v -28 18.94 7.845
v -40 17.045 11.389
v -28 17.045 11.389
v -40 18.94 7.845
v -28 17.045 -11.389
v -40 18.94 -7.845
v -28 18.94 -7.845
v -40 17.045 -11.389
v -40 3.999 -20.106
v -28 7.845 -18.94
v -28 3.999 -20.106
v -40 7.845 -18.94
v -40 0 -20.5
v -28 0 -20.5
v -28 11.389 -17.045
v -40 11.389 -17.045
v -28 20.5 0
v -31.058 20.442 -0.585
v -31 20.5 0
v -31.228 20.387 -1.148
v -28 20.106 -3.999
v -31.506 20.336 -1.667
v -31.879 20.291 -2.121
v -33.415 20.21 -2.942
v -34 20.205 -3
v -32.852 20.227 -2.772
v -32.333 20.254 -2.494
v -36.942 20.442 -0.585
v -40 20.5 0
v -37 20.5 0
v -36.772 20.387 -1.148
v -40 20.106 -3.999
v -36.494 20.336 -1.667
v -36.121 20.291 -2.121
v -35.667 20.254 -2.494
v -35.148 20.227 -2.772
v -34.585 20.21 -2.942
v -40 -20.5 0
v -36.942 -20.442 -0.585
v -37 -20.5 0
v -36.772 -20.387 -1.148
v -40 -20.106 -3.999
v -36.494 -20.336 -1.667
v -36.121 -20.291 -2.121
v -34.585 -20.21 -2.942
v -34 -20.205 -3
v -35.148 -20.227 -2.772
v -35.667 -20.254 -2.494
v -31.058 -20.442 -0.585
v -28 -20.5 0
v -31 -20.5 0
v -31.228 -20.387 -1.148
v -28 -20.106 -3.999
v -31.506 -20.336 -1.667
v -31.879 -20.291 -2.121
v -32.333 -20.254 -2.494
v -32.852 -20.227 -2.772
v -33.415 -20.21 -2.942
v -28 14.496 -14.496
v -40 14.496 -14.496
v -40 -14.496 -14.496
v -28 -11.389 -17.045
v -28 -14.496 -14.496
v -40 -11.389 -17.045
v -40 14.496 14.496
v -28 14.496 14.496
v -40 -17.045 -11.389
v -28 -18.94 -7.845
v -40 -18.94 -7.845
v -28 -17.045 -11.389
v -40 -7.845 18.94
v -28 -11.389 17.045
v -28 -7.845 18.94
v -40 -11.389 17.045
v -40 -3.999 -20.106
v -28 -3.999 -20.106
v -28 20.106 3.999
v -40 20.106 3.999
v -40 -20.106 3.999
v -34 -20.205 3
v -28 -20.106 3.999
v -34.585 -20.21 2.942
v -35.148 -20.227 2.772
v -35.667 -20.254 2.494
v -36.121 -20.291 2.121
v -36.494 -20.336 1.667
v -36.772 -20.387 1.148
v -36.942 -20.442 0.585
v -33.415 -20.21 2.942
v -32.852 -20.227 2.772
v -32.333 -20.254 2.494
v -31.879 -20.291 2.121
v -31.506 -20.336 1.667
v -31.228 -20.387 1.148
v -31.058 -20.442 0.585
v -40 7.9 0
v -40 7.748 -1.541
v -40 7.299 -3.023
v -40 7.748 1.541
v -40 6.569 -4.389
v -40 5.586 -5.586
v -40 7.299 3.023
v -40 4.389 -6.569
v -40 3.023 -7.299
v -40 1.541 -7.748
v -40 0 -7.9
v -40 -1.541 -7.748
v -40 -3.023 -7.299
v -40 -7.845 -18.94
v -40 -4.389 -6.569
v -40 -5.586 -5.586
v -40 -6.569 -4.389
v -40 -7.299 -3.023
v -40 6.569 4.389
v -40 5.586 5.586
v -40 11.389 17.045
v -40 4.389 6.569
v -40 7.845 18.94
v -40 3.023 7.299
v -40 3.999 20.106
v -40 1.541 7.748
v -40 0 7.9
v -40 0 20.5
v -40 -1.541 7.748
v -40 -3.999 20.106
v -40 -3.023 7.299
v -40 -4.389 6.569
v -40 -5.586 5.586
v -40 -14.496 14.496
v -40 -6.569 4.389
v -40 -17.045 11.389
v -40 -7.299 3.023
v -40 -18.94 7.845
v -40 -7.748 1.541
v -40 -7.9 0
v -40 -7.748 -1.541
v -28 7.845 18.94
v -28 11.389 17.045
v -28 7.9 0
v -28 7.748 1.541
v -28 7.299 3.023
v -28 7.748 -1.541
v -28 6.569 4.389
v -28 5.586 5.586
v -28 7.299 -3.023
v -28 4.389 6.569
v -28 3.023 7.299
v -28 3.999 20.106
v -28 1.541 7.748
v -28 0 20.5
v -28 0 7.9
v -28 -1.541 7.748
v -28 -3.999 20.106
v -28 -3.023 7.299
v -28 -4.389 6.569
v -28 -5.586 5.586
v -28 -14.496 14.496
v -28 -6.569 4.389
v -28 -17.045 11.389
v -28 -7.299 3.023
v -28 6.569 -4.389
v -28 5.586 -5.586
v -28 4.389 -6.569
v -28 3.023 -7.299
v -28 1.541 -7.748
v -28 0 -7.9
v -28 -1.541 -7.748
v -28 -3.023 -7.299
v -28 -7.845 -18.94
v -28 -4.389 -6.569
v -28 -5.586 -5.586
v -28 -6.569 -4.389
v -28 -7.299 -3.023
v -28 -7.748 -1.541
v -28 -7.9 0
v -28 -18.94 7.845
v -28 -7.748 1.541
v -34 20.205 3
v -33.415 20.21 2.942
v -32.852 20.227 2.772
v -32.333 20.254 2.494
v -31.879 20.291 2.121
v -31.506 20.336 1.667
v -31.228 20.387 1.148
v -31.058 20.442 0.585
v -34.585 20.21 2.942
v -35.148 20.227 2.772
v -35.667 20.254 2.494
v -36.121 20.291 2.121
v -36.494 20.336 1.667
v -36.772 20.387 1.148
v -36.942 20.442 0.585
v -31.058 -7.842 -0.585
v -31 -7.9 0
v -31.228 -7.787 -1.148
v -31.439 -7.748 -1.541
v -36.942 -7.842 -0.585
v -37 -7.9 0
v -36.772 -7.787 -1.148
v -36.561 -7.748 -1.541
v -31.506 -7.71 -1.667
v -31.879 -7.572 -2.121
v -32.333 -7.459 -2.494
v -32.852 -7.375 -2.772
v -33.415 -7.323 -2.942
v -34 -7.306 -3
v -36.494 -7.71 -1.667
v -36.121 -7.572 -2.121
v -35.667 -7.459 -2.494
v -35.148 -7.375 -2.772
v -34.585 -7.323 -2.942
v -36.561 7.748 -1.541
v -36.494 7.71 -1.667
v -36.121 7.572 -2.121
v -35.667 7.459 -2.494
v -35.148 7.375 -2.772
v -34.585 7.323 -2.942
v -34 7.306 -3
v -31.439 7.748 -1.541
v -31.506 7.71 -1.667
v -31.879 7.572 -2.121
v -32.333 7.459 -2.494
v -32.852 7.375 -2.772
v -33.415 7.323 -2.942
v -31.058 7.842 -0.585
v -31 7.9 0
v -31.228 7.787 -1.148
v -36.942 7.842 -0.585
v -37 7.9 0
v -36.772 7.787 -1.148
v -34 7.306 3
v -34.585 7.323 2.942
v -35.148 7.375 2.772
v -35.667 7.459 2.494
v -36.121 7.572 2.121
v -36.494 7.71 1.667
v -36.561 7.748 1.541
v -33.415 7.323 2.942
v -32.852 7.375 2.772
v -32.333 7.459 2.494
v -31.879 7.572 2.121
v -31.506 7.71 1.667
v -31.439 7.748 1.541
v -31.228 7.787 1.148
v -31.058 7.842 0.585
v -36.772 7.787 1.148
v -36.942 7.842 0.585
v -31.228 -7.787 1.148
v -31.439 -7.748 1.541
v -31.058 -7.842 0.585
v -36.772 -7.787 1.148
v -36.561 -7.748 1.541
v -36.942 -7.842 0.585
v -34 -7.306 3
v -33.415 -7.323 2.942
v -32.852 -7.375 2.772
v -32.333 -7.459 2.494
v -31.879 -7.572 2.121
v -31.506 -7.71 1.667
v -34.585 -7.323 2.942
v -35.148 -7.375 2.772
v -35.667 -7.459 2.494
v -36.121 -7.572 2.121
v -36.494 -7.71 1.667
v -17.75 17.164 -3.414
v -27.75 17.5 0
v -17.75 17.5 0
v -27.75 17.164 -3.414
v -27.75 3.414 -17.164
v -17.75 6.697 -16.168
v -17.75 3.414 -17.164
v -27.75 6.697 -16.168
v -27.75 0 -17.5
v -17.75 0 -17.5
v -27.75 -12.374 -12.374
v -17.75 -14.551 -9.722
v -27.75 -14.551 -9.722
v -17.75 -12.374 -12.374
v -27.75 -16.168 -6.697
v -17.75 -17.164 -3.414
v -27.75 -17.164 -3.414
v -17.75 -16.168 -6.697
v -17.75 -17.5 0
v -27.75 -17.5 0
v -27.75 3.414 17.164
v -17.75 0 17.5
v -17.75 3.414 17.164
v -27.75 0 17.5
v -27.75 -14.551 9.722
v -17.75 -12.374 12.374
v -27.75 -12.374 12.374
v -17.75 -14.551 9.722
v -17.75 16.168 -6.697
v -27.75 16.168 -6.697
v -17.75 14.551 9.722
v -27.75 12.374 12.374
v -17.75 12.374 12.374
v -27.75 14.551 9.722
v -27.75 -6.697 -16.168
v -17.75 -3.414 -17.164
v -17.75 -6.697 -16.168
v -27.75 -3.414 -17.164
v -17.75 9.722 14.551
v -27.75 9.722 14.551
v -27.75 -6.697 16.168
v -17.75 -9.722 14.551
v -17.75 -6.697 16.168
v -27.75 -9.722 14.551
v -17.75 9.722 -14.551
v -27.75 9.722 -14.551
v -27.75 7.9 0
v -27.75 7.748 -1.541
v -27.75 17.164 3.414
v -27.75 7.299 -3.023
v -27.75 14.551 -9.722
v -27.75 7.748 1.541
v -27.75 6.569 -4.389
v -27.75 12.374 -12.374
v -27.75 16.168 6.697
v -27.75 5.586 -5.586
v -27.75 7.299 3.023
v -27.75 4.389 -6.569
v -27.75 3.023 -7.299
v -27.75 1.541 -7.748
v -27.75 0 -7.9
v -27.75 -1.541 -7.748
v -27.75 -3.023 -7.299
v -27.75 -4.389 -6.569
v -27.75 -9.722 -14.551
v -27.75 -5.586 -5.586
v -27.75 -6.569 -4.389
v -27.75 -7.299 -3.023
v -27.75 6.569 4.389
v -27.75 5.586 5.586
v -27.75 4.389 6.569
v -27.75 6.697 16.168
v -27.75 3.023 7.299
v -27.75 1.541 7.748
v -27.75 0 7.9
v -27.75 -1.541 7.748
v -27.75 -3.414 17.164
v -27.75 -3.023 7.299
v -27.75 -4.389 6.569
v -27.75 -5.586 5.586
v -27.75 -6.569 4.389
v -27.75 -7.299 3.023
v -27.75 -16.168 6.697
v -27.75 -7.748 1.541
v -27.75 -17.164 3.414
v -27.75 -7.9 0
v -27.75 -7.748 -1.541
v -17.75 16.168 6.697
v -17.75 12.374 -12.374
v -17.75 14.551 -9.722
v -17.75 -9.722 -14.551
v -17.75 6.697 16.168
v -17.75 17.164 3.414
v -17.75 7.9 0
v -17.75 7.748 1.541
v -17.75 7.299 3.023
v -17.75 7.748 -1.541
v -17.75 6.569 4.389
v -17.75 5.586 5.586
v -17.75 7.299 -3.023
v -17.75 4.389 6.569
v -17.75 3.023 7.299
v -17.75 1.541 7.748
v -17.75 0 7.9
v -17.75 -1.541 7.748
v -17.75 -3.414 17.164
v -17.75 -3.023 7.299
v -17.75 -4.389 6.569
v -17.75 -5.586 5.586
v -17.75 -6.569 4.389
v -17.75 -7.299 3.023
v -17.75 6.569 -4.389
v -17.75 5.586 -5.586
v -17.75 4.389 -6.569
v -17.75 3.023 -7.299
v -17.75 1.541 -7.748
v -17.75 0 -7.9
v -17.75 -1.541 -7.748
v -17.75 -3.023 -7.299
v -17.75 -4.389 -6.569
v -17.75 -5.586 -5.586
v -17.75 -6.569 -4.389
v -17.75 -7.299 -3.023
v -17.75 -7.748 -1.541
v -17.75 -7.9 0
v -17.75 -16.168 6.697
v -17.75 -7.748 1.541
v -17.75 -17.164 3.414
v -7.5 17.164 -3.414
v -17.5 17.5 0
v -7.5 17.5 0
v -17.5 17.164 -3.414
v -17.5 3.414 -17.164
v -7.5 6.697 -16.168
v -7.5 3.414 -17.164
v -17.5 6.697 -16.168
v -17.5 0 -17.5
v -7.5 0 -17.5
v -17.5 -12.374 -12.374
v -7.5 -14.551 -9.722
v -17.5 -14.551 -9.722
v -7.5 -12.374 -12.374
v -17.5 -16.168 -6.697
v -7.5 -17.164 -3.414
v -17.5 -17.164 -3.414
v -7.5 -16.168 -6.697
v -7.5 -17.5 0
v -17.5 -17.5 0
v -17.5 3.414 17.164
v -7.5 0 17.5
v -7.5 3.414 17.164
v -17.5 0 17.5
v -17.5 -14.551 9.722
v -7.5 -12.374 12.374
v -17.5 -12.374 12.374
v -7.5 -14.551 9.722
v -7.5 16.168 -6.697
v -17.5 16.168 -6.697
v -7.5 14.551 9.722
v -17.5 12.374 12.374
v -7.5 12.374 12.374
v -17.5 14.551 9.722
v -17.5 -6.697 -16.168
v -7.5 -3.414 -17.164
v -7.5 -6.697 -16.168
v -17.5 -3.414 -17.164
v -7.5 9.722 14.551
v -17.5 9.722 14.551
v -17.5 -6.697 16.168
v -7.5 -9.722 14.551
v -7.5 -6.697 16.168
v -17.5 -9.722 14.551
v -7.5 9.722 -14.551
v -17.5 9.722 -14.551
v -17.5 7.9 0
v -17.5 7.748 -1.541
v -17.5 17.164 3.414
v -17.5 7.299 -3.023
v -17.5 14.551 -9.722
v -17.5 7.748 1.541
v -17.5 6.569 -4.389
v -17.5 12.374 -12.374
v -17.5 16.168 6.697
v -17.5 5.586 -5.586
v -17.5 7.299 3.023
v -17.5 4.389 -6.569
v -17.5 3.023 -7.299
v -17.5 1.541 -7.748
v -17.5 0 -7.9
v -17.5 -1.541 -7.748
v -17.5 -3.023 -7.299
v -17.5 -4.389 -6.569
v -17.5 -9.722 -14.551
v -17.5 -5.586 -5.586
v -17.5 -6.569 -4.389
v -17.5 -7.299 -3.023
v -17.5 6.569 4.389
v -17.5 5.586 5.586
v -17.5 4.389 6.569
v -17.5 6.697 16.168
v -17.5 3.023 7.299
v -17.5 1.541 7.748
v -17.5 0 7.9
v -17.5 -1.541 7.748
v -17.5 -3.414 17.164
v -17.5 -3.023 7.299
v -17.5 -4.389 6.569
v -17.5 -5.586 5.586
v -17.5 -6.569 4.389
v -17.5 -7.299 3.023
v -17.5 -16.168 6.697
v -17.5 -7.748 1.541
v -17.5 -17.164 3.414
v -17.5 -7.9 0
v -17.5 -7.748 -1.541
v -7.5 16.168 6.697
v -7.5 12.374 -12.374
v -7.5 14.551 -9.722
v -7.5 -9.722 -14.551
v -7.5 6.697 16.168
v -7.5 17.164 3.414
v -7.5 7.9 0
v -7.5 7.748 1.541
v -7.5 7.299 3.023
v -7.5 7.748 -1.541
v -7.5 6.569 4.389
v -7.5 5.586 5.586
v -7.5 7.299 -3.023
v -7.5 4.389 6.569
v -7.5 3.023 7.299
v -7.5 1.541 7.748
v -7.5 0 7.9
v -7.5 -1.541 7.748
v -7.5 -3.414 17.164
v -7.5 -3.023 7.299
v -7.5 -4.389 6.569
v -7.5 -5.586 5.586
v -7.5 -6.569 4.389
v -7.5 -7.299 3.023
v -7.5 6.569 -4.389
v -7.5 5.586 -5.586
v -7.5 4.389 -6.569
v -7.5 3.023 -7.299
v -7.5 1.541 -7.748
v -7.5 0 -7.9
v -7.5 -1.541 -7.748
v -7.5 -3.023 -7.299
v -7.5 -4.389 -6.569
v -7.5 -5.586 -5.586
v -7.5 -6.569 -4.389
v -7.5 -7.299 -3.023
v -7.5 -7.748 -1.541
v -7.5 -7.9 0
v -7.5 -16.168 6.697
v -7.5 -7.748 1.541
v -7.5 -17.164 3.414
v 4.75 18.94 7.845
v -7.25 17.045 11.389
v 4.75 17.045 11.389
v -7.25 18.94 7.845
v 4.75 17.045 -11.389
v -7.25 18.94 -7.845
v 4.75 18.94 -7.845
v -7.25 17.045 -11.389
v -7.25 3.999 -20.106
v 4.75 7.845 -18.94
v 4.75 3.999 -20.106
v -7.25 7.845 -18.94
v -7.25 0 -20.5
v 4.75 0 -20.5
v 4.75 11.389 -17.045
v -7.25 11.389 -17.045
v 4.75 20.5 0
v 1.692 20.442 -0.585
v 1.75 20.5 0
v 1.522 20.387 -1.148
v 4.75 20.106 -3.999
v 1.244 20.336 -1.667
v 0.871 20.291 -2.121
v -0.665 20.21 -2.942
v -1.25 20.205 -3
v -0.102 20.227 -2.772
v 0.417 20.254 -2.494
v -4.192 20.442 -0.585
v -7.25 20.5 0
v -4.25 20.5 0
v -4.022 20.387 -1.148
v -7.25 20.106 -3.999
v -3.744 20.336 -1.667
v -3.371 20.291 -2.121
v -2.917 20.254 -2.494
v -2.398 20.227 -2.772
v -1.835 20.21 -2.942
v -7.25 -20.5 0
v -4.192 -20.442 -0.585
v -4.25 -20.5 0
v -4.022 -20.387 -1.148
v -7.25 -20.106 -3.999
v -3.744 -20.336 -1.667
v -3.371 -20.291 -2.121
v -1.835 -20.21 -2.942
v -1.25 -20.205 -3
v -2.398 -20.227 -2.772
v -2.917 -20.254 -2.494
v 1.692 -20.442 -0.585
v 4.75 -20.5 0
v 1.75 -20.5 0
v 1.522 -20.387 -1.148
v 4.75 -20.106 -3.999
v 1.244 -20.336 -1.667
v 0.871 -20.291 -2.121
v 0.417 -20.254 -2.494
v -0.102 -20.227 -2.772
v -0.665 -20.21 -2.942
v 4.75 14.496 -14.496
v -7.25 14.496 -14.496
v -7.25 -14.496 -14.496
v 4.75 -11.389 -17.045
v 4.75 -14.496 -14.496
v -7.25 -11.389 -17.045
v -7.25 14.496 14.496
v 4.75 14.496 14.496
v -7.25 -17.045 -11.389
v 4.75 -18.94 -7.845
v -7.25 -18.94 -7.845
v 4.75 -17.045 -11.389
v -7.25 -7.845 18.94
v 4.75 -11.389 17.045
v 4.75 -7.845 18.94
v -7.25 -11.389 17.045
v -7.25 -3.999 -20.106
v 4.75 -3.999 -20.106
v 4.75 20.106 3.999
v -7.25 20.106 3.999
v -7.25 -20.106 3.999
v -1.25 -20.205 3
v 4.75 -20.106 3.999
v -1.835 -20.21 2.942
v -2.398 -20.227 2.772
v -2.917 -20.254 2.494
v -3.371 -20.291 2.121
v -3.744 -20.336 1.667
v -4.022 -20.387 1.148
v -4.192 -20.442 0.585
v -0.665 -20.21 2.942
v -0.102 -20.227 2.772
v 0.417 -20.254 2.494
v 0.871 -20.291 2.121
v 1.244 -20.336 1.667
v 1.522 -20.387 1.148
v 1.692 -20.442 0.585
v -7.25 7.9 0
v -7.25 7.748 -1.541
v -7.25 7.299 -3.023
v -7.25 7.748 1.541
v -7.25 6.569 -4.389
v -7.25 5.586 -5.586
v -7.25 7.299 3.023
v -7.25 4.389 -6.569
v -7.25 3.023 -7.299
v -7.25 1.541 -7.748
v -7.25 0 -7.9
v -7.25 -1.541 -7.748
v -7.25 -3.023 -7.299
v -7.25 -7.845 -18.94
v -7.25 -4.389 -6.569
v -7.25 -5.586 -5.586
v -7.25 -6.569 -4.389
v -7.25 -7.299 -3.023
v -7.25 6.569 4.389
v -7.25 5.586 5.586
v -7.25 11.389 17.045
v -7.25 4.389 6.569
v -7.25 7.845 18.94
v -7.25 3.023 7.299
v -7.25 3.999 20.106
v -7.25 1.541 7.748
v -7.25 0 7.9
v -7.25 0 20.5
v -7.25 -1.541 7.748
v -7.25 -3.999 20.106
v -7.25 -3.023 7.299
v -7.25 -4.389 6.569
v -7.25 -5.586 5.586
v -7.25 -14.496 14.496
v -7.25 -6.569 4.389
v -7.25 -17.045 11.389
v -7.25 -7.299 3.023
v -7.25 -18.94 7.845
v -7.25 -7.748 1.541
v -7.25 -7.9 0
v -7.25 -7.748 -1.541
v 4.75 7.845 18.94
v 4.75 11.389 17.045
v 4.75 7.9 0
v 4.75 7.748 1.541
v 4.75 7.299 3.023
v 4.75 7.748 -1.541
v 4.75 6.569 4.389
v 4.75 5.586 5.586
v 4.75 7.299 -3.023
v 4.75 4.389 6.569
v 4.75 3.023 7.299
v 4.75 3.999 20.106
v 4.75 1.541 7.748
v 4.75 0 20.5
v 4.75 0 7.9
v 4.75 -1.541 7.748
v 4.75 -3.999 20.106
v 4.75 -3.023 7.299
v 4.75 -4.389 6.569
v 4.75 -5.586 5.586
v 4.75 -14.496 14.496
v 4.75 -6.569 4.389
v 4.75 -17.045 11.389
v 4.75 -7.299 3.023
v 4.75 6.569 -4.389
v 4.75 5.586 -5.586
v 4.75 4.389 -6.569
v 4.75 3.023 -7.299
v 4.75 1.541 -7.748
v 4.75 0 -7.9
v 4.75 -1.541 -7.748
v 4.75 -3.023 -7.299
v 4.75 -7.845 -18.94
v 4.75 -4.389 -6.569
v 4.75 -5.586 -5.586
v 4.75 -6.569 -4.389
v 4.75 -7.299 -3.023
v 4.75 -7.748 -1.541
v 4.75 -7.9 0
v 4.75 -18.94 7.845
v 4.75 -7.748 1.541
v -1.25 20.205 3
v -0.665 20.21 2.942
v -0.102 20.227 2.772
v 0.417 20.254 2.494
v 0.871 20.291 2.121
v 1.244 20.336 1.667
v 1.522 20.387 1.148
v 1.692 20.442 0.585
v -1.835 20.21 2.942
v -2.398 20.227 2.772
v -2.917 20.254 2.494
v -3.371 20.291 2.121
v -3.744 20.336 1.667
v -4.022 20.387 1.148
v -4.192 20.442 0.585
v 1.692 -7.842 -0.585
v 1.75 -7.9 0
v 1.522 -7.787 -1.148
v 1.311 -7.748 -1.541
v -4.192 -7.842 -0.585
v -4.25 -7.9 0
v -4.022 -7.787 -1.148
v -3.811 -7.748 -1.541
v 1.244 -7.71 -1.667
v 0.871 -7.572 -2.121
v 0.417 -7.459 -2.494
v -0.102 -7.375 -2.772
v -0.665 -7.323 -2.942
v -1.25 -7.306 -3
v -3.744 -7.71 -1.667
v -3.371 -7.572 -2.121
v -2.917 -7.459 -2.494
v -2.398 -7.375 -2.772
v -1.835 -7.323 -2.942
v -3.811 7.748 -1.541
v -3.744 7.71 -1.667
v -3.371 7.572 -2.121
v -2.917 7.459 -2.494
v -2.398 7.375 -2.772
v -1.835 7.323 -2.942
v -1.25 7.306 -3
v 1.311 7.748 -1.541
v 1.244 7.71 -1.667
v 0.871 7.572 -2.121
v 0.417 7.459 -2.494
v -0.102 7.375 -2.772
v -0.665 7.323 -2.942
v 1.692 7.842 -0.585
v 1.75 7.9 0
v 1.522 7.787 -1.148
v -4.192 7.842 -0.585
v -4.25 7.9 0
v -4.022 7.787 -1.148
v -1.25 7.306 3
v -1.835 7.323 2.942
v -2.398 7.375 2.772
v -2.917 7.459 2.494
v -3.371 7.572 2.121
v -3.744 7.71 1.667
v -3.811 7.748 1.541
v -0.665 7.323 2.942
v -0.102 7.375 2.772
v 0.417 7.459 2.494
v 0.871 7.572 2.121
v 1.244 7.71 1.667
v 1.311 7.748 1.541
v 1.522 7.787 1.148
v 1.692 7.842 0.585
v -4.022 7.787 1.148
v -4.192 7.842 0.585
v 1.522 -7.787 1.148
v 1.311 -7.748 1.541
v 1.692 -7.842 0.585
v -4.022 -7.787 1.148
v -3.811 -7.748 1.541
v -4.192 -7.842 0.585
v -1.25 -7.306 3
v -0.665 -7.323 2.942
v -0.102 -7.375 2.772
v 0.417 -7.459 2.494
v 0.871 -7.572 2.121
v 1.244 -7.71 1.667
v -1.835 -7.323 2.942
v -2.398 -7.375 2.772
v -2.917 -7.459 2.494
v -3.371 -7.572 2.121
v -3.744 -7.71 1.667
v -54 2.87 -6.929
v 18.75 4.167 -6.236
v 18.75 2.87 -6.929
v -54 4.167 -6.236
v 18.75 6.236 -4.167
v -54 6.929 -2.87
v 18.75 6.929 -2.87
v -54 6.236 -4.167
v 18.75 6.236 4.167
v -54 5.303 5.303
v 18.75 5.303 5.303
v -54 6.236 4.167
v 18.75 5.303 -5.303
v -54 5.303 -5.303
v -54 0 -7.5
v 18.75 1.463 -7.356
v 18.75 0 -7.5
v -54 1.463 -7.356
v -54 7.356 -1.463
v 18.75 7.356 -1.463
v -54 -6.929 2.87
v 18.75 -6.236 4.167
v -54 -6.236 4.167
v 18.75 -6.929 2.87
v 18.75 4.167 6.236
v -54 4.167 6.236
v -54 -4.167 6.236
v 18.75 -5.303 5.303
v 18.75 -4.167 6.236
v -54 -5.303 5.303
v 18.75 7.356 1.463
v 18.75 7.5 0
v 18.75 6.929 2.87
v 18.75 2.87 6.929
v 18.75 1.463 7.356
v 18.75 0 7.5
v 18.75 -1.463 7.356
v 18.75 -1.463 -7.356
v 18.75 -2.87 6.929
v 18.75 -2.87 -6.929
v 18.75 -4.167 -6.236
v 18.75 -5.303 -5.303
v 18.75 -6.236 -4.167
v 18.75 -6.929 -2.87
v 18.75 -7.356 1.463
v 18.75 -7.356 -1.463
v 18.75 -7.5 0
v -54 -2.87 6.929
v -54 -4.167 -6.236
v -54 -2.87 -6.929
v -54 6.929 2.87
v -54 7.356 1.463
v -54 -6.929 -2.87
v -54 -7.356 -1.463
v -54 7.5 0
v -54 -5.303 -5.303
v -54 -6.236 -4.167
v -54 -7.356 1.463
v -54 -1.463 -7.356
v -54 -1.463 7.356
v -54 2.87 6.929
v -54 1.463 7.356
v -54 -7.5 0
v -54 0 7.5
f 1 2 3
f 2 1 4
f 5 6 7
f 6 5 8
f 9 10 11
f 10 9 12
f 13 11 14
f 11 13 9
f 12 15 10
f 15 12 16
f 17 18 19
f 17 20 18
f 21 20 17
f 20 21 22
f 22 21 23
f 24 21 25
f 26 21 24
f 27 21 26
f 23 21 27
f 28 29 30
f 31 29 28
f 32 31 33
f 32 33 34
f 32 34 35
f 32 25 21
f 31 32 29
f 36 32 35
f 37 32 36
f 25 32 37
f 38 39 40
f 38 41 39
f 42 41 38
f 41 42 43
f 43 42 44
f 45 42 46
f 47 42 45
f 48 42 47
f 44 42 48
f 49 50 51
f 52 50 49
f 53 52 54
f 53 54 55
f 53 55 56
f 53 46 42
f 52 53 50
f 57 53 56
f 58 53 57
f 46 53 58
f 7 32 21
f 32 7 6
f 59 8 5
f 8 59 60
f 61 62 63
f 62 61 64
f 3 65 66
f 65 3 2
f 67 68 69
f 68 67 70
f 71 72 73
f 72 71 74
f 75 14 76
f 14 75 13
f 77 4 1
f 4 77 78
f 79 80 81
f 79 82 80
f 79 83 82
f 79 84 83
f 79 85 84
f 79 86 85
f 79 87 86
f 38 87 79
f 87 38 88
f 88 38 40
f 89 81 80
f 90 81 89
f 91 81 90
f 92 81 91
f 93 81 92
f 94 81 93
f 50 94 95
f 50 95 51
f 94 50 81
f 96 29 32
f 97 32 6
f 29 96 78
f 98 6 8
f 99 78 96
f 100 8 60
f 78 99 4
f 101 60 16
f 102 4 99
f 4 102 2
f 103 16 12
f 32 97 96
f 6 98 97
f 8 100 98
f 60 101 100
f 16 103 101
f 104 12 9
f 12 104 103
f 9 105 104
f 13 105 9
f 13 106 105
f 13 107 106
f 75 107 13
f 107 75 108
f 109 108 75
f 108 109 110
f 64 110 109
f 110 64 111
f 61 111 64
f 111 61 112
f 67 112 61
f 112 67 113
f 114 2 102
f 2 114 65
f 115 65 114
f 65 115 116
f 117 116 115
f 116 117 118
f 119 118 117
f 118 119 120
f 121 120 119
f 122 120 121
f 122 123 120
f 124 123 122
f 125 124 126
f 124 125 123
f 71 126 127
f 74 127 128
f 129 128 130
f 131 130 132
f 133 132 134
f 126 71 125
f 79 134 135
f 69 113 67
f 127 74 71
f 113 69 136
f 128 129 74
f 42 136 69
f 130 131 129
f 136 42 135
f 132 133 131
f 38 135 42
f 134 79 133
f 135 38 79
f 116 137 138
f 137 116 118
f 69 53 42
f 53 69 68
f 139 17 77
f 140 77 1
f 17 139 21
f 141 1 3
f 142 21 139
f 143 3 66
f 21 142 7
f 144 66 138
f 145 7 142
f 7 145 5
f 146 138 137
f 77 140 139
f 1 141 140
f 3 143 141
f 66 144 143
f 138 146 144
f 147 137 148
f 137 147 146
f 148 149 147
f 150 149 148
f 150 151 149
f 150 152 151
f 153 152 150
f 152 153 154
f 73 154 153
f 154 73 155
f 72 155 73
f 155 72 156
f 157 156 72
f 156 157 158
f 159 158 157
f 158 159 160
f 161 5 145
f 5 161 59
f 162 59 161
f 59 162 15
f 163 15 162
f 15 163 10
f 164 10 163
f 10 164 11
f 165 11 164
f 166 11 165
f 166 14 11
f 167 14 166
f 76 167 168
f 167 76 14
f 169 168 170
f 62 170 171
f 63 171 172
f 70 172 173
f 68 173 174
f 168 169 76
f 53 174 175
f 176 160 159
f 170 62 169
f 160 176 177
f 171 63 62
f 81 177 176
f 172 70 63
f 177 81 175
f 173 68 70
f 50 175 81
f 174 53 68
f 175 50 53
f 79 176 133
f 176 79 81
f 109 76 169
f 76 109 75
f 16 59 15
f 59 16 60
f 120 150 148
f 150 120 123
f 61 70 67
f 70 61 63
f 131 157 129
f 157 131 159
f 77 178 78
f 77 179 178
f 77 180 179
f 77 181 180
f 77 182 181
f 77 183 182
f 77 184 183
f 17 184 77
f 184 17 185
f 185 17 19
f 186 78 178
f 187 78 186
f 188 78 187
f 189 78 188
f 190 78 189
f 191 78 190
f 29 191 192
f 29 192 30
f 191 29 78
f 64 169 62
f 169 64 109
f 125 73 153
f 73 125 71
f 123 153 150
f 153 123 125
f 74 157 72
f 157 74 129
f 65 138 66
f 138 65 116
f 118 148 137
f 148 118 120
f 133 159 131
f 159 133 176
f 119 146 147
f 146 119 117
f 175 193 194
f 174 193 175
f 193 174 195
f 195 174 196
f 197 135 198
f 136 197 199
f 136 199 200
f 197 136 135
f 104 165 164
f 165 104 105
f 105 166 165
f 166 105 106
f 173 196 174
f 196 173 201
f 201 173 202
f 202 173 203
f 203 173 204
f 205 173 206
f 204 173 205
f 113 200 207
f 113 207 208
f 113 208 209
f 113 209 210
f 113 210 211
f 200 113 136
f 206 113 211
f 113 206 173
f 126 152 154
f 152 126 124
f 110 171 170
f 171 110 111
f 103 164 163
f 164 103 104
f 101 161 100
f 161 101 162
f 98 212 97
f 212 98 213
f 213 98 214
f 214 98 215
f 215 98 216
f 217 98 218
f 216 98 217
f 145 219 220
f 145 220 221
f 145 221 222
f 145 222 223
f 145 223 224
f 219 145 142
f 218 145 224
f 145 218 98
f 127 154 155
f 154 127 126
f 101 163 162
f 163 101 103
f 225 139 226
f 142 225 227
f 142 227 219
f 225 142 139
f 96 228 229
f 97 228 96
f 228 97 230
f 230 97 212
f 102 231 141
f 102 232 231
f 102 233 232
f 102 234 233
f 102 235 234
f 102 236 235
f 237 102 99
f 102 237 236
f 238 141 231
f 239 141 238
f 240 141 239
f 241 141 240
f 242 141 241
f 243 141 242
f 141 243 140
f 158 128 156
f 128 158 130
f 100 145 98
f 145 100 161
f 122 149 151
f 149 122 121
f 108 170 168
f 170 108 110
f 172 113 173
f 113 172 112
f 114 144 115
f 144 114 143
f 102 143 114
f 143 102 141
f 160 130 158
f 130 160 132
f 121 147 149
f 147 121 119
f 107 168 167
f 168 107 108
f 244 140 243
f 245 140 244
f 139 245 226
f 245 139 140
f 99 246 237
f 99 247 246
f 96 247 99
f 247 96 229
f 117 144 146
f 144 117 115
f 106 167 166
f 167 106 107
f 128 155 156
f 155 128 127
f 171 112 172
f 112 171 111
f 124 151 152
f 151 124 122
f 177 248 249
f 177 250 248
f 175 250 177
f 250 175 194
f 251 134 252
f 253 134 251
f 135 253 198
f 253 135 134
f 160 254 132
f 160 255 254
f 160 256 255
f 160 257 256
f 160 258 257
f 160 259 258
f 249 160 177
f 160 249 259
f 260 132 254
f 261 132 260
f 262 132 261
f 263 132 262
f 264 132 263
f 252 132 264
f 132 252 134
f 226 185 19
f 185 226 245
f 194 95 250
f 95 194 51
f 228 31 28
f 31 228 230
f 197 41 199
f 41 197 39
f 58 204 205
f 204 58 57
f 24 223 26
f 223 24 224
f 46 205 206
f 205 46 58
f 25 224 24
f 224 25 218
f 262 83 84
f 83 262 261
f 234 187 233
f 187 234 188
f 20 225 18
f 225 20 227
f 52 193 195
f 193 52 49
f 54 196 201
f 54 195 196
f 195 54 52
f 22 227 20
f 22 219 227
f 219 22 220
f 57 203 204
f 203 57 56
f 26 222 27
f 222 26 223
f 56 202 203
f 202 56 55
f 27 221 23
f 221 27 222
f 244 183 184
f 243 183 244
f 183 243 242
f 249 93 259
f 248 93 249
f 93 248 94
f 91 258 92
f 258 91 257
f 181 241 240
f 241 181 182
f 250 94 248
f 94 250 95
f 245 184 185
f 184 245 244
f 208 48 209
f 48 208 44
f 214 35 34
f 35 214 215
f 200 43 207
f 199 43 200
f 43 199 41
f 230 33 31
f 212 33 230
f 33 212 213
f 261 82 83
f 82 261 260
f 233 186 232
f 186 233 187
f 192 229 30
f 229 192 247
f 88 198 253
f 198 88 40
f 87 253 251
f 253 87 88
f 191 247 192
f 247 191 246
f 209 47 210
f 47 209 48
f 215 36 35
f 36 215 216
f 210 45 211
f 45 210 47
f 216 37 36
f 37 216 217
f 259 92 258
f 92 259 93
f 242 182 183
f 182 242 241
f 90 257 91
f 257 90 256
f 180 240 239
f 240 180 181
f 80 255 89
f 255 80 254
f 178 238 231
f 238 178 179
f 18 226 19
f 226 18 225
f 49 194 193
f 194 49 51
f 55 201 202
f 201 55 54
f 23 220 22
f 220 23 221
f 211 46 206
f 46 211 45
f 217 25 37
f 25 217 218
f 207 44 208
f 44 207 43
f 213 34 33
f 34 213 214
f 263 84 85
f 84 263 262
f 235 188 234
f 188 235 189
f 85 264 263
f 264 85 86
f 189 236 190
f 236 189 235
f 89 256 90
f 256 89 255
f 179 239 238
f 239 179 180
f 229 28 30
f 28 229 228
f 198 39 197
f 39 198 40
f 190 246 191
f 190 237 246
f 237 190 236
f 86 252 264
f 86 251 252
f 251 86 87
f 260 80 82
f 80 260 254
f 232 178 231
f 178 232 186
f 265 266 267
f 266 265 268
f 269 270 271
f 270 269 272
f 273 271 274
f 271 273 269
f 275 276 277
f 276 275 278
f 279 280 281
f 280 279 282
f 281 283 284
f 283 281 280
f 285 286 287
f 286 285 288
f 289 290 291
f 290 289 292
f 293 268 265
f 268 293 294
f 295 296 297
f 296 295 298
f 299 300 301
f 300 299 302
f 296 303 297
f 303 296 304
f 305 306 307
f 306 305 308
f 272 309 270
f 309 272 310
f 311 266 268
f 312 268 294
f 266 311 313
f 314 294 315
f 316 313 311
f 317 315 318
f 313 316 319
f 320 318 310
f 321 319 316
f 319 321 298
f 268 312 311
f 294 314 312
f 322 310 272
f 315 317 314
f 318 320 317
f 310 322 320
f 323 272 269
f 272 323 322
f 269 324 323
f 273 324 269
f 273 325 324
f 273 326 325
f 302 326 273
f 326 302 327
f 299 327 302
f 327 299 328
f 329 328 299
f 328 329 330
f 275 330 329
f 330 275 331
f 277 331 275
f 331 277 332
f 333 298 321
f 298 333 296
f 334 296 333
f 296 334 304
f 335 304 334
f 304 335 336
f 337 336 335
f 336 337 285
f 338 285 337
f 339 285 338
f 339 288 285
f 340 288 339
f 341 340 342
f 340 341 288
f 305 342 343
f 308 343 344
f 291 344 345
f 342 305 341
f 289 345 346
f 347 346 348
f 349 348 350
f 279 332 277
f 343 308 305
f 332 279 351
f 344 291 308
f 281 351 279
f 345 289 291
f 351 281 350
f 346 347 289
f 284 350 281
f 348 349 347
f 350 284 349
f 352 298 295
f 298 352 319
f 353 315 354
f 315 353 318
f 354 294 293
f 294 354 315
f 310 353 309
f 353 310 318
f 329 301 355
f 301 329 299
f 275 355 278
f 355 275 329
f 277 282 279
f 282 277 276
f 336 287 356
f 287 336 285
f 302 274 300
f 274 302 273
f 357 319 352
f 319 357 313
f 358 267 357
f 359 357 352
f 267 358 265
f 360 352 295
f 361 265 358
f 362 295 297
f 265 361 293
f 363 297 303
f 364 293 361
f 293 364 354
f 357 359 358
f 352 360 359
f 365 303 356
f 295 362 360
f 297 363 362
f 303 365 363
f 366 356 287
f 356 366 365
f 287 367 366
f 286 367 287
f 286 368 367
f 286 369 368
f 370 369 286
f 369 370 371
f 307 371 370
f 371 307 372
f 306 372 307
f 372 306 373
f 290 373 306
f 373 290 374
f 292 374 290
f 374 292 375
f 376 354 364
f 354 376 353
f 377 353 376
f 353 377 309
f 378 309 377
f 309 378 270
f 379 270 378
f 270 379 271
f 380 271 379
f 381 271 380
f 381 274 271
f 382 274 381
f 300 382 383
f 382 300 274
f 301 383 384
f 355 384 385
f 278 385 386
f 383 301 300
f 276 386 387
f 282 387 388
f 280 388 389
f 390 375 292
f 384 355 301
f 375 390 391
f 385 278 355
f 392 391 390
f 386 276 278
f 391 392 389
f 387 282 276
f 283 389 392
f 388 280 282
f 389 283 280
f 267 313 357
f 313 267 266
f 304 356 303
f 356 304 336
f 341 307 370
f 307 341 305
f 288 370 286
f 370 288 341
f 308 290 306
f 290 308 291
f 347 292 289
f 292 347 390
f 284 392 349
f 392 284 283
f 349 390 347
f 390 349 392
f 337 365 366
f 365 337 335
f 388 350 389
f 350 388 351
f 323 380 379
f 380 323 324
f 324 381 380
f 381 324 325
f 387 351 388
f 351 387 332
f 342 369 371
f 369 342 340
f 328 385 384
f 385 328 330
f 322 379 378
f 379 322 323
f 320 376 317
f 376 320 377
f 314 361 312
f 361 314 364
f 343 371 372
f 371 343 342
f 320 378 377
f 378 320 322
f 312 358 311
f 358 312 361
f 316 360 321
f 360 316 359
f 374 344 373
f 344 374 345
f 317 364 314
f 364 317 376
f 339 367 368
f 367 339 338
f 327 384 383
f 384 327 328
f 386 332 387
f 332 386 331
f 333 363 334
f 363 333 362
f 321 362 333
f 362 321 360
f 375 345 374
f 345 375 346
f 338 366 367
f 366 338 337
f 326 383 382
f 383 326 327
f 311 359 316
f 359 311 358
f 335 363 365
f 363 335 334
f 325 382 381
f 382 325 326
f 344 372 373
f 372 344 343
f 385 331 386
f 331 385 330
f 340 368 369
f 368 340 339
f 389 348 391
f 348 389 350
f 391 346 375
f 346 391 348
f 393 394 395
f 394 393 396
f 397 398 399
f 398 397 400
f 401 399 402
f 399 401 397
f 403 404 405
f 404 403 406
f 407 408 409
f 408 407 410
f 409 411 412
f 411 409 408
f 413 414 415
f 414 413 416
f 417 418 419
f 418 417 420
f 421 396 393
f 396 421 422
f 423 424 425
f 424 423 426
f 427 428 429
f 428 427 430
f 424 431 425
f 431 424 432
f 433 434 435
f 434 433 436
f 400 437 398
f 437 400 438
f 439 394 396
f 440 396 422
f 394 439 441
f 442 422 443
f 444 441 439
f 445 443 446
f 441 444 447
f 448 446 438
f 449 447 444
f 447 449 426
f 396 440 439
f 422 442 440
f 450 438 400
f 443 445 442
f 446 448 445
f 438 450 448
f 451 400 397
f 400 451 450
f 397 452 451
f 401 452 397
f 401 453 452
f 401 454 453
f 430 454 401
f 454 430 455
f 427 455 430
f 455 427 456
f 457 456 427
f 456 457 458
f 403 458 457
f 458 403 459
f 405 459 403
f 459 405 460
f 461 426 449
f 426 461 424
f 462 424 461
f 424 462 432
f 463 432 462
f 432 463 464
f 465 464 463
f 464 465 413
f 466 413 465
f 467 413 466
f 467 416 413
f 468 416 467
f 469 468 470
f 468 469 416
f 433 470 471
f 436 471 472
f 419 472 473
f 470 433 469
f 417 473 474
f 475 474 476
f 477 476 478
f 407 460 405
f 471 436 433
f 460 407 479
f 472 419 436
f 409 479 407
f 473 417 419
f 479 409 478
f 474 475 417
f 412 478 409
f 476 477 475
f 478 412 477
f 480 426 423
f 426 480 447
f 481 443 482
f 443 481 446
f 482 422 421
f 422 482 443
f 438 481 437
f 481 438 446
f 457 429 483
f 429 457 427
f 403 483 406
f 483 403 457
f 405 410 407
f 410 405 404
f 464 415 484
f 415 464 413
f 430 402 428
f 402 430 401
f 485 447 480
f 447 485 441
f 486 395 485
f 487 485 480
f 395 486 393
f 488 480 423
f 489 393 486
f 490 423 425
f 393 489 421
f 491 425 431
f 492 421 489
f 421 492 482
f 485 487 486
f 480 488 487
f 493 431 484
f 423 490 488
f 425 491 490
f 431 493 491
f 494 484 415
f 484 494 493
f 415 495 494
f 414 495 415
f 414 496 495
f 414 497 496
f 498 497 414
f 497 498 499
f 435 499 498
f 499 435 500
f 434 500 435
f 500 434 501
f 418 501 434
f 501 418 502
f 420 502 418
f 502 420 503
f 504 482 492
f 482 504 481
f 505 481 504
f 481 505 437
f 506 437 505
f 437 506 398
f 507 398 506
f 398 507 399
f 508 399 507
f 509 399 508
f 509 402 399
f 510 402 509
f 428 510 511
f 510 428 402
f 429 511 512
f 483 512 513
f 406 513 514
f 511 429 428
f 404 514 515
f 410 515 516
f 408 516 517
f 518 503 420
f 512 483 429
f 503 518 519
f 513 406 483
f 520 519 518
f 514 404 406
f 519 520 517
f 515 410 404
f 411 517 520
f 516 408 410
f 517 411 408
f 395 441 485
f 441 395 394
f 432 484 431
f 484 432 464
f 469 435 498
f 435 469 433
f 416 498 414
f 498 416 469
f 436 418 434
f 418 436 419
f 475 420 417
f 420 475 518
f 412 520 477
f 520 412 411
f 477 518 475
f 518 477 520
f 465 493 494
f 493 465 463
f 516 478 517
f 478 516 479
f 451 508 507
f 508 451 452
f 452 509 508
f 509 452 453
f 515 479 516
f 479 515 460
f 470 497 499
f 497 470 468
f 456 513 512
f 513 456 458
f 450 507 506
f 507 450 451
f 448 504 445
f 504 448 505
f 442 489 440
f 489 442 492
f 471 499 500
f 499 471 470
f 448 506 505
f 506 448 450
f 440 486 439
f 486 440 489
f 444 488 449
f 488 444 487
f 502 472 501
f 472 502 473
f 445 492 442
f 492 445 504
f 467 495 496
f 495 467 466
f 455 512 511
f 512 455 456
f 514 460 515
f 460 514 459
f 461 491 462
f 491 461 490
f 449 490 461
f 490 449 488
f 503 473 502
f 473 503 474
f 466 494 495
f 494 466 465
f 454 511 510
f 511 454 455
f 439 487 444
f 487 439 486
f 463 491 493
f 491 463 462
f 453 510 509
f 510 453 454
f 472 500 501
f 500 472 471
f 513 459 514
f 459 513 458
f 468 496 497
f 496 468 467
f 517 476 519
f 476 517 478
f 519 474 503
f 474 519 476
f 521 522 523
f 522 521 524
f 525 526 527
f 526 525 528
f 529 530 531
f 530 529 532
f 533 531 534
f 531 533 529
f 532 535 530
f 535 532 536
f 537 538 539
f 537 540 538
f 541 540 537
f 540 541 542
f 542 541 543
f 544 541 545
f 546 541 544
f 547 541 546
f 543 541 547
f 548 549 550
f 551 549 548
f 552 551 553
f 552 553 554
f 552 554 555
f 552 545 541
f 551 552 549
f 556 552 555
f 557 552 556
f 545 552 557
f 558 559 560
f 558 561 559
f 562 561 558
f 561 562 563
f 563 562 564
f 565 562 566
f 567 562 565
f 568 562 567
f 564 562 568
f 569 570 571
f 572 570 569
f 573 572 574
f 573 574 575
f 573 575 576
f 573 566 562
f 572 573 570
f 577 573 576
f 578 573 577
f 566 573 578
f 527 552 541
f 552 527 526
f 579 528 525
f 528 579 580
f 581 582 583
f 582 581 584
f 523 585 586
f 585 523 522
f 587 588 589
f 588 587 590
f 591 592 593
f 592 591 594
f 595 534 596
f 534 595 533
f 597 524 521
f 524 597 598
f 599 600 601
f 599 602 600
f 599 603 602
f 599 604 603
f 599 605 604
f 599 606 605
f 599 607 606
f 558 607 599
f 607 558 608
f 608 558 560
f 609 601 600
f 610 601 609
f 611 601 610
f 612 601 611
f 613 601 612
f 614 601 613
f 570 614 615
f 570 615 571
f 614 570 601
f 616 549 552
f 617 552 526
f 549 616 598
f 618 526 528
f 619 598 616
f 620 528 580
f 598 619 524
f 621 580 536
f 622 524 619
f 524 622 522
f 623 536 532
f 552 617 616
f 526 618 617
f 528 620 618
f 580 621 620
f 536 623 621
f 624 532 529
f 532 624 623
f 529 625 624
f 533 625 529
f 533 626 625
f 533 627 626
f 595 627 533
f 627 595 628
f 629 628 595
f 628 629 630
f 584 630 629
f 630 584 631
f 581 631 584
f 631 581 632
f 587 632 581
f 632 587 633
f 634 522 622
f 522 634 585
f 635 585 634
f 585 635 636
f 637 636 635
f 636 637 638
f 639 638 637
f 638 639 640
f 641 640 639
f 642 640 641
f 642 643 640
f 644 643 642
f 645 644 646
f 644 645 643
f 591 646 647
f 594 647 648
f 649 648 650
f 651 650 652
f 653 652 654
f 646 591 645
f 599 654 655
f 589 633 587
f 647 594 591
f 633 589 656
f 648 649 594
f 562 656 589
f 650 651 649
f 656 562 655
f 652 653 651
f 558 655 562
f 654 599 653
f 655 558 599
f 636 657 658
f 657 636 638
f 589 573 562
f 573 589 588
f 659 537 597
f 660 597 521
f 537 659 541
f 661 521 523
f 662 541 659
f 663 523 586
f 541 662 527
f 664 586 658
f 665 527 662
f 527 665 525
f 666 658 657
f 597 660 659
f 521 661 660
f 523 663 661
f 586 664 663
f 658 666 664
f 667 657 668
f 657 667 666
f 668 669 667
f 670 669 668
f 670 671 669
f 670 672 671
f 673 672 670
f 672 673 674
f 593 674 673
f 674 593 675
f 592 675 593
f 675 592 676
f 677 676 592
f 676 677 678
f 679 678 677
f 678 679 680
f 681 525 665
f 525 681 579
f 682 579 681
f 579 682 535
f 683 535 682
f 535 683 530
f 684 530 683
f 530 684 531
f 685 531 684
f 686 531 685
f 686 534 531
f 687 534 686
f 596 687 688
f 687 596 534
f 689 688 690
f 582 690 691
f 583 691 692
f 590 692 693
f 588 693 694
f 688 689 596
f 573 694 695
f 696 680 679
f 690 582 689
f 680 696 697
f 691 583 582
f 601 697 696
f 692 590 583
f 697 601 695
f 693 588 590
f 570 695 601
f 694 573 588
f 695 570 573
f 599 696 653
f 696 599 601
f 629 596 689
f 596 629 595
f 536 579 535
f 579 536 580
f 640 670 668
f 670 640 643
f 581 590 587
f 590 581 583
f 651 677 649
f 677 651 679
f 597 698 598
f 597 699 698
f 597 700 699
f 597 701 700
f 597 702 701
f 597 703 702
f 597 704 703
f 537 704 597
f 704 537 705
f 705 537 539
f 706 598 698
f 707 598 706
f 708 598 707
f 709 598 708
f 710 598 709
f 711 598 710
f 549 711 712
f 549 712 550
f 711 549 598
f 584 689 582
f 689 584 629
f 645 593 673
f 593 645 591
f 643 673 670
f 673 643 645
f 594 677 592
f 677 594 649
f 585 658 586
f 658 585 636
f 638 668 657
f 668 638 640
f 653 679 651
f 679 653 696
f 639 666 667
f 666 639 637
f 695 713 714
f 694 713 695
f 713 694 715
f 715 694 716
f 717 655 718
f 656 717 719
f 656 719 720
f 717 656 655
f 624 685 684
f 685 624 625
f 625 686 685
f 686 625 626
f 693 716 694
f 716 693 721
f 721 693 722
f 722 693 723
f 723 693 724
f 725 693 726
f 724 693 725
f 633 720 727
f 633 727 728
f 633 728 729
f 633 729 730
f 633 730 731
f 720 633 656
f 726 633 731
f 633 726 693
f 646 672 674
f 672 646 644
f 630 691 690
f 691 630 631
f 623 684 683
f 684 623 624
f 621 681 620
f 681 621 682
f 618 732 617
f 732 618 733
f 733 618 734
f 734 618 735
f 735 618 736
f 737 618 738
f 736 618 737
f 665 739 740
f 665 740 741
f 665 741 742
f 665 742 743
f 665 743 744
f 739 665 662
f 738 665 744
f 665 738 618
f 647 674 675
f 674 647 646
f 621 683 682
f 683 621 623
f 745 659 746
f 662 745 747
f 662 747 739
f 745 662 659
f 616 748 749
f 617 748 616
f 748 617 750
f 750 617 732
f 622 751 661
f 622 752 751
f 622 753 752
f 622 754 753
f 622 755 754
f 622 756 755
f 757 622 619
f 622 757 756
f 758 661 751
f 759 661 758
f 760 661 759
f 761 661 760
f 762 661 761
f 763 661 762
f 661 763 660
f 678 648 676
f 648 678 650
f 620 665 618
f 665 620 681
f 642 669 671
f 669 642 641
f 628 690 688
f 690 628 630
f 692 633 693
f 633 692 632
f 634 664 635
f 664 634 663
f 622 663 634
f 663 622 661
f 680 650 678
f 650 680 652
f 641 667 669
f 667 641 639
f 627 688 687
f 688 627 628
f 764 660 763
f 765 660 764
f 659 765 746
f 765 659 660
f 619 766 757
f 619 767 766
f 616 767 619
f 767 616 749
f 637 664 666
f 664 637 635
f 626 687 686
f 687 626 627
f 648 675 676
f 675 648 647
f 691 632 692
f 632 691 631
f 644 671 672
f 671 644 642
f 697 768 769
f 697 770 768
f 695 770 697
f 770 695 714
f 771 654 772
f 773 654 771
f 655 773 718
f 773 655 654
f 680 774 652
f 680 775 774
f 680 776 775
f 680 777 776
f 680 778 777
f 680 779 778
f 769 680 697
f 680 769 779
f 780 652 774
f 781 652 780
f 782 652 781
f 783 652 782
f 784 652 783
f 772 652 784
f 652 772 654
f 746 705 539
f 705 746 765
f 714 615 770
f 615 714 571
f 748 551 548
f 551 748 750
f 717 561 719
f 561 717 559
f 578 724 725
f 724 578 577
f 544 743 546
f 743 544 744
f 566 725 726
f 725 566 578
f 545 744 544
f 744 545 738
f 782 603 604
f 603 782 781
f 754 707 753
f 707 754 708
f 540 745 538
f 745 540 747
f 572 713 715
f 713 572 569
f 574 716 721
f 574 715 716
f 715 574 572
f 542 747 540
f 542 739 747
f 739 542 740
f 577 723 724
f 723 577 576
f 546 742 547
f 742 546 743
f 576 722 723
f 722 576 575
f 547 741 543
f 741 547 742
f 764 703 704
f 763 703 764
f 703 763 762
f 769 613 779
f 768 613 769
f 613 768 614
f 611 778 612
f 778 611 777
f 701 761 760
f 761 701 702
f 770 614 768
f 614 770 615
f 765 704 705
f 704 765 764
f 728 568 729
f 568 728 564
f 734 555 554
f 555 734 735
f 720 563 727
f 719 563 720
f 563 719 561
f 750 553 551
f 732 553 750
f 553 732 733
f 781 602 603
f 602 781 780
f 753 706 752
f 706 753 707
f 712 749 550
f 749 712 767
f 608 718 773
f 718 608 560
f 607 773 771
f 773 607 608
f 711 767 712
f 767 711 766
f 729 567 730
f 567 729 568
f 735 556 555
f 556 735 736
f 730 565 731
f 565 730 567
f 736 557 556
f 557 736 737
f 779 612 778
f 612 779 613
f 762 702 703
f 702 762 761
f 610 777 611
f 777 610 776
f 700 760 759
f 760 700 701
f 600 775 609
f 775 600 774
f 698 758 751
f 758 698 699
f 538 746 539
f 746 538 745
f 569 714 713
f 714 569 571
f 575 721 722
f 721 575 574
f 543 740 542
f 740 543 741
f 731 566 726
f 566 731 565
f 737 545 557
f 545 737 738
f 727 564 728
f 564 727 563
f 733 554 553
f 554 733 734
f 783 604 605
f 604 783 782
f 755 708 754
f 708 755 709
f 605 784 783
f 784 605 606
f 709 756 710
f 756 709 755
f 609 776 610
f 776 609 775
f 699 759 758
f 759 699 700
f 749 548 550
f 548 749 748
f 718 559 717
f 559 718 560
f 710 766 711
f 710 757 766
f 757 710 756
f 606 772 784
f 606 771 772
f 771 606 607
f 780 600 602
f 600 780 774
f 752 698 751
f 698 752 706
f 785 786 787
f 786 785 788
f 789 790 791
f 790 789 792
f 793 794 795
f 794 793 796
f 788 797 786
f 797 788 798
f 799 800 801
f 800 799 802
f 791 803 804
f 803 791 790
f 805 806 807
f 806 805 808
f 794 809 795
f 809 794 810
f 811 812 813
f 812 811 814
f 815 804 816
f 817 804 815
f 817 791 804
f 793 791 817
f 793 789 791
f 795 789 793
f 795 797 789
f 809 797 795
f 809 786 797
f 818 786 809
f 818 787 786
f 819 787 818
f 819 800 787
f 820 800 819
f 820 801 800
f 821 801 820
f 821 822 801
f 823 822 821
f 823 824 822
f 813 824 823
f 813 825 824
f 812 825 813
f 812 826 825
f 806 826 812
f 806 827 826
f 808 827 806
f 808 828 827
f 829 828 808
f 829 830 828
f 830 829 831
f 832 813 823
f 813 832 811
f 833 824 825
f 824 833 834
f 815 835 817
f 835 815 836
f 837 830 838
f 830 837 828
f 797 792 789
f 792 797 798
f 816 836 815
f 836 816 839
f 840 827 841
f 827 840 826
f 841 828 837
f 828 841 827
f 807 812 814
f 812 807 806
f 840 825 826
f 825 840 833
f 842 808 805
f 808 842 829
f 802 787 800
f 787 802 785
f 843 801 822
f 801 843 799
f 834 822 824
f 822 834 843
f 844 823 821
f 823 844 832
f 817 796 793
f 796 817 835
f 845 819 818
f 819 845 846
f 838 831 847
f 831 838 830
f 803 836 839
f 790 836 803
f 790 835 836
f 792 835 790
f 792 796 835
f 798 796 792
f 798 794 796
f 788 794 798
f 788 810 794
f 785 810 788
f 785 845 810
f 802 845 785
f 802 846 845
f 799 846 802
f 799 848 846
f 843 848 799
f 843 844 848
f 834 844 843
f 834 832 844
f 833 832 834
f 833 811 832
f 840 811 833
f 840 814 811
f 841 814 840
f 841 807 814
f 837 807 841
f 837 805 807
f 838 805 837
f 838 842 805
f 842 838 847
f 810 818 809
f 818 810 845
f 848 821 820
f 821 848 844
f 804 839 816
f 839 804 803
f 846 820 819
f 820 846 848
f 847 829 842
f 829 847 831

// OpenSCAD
$fn = 32;

// ------------------------------------------------------------------------
// Shaft with rings and collars: d15 shaft, 4 rings
// Every part is its own module, assembly() places them once.
// ------------------------------------------------------------------------

// --- part 1 ---
module shaft() {
  translate([0, 0, -36.375]) cylinder(h = 72.75, d = 15);
}

// --- part 2 ---
module collar_a() {
  difference() {
    cylinder(h = 12, d = 41);
    translate([0, 0, -1]) cylinder(h = 14, d = 15.8);
    translate([0, 0, 6]) rotate([90, 0, 0]) cylinder(h = 43, d = 6, center = true);
  }
}

// --- part 3 ---
module spacer_a() {
  difference() {
      translate([0, 0, 0]) cylinder(h = 10, d = 35);
      translate([0, 0, -1]) cylinder(h = 12, d = 15.8);
    }
}

// --- part 4 ---
module spacer_b() {
  difference() {
      translate([0, 0, 0]) cylinder(h = 10, d = 35);
      translate([0, 0, -1]) cylinder(h = 12, d = 15.8);
    }
}

// --- part 5 ---
module collar_b() {
  difference() {
    cylinder(h = 12, d = 41);
    translate([0, 0, -1]) cylinder(h = 14, d = 15.8);
    translate([0, 0, 6]) rotate([90, 0, 0]) cylinder(h = 43, d = 6, center = true);
  }
}

// --- assembly ---
module assembly() {
  translate([-17.625, 0, 0]) rotate([0, 90, 0]) shaft();
  translate([-40, 0, 0]) rotate([0, 90, 0]) collar_a();
  translate([-27.75, 0, 0]) rotate([0, 90, 0]) spacer_a();
  translate([-17.5, 0, 0]) rotate([0, 90, 0]) spacer_b();
  translate([-7.25, 0, 0]) rotate([0, 90, 0]) collar_b();
}

assembly();
